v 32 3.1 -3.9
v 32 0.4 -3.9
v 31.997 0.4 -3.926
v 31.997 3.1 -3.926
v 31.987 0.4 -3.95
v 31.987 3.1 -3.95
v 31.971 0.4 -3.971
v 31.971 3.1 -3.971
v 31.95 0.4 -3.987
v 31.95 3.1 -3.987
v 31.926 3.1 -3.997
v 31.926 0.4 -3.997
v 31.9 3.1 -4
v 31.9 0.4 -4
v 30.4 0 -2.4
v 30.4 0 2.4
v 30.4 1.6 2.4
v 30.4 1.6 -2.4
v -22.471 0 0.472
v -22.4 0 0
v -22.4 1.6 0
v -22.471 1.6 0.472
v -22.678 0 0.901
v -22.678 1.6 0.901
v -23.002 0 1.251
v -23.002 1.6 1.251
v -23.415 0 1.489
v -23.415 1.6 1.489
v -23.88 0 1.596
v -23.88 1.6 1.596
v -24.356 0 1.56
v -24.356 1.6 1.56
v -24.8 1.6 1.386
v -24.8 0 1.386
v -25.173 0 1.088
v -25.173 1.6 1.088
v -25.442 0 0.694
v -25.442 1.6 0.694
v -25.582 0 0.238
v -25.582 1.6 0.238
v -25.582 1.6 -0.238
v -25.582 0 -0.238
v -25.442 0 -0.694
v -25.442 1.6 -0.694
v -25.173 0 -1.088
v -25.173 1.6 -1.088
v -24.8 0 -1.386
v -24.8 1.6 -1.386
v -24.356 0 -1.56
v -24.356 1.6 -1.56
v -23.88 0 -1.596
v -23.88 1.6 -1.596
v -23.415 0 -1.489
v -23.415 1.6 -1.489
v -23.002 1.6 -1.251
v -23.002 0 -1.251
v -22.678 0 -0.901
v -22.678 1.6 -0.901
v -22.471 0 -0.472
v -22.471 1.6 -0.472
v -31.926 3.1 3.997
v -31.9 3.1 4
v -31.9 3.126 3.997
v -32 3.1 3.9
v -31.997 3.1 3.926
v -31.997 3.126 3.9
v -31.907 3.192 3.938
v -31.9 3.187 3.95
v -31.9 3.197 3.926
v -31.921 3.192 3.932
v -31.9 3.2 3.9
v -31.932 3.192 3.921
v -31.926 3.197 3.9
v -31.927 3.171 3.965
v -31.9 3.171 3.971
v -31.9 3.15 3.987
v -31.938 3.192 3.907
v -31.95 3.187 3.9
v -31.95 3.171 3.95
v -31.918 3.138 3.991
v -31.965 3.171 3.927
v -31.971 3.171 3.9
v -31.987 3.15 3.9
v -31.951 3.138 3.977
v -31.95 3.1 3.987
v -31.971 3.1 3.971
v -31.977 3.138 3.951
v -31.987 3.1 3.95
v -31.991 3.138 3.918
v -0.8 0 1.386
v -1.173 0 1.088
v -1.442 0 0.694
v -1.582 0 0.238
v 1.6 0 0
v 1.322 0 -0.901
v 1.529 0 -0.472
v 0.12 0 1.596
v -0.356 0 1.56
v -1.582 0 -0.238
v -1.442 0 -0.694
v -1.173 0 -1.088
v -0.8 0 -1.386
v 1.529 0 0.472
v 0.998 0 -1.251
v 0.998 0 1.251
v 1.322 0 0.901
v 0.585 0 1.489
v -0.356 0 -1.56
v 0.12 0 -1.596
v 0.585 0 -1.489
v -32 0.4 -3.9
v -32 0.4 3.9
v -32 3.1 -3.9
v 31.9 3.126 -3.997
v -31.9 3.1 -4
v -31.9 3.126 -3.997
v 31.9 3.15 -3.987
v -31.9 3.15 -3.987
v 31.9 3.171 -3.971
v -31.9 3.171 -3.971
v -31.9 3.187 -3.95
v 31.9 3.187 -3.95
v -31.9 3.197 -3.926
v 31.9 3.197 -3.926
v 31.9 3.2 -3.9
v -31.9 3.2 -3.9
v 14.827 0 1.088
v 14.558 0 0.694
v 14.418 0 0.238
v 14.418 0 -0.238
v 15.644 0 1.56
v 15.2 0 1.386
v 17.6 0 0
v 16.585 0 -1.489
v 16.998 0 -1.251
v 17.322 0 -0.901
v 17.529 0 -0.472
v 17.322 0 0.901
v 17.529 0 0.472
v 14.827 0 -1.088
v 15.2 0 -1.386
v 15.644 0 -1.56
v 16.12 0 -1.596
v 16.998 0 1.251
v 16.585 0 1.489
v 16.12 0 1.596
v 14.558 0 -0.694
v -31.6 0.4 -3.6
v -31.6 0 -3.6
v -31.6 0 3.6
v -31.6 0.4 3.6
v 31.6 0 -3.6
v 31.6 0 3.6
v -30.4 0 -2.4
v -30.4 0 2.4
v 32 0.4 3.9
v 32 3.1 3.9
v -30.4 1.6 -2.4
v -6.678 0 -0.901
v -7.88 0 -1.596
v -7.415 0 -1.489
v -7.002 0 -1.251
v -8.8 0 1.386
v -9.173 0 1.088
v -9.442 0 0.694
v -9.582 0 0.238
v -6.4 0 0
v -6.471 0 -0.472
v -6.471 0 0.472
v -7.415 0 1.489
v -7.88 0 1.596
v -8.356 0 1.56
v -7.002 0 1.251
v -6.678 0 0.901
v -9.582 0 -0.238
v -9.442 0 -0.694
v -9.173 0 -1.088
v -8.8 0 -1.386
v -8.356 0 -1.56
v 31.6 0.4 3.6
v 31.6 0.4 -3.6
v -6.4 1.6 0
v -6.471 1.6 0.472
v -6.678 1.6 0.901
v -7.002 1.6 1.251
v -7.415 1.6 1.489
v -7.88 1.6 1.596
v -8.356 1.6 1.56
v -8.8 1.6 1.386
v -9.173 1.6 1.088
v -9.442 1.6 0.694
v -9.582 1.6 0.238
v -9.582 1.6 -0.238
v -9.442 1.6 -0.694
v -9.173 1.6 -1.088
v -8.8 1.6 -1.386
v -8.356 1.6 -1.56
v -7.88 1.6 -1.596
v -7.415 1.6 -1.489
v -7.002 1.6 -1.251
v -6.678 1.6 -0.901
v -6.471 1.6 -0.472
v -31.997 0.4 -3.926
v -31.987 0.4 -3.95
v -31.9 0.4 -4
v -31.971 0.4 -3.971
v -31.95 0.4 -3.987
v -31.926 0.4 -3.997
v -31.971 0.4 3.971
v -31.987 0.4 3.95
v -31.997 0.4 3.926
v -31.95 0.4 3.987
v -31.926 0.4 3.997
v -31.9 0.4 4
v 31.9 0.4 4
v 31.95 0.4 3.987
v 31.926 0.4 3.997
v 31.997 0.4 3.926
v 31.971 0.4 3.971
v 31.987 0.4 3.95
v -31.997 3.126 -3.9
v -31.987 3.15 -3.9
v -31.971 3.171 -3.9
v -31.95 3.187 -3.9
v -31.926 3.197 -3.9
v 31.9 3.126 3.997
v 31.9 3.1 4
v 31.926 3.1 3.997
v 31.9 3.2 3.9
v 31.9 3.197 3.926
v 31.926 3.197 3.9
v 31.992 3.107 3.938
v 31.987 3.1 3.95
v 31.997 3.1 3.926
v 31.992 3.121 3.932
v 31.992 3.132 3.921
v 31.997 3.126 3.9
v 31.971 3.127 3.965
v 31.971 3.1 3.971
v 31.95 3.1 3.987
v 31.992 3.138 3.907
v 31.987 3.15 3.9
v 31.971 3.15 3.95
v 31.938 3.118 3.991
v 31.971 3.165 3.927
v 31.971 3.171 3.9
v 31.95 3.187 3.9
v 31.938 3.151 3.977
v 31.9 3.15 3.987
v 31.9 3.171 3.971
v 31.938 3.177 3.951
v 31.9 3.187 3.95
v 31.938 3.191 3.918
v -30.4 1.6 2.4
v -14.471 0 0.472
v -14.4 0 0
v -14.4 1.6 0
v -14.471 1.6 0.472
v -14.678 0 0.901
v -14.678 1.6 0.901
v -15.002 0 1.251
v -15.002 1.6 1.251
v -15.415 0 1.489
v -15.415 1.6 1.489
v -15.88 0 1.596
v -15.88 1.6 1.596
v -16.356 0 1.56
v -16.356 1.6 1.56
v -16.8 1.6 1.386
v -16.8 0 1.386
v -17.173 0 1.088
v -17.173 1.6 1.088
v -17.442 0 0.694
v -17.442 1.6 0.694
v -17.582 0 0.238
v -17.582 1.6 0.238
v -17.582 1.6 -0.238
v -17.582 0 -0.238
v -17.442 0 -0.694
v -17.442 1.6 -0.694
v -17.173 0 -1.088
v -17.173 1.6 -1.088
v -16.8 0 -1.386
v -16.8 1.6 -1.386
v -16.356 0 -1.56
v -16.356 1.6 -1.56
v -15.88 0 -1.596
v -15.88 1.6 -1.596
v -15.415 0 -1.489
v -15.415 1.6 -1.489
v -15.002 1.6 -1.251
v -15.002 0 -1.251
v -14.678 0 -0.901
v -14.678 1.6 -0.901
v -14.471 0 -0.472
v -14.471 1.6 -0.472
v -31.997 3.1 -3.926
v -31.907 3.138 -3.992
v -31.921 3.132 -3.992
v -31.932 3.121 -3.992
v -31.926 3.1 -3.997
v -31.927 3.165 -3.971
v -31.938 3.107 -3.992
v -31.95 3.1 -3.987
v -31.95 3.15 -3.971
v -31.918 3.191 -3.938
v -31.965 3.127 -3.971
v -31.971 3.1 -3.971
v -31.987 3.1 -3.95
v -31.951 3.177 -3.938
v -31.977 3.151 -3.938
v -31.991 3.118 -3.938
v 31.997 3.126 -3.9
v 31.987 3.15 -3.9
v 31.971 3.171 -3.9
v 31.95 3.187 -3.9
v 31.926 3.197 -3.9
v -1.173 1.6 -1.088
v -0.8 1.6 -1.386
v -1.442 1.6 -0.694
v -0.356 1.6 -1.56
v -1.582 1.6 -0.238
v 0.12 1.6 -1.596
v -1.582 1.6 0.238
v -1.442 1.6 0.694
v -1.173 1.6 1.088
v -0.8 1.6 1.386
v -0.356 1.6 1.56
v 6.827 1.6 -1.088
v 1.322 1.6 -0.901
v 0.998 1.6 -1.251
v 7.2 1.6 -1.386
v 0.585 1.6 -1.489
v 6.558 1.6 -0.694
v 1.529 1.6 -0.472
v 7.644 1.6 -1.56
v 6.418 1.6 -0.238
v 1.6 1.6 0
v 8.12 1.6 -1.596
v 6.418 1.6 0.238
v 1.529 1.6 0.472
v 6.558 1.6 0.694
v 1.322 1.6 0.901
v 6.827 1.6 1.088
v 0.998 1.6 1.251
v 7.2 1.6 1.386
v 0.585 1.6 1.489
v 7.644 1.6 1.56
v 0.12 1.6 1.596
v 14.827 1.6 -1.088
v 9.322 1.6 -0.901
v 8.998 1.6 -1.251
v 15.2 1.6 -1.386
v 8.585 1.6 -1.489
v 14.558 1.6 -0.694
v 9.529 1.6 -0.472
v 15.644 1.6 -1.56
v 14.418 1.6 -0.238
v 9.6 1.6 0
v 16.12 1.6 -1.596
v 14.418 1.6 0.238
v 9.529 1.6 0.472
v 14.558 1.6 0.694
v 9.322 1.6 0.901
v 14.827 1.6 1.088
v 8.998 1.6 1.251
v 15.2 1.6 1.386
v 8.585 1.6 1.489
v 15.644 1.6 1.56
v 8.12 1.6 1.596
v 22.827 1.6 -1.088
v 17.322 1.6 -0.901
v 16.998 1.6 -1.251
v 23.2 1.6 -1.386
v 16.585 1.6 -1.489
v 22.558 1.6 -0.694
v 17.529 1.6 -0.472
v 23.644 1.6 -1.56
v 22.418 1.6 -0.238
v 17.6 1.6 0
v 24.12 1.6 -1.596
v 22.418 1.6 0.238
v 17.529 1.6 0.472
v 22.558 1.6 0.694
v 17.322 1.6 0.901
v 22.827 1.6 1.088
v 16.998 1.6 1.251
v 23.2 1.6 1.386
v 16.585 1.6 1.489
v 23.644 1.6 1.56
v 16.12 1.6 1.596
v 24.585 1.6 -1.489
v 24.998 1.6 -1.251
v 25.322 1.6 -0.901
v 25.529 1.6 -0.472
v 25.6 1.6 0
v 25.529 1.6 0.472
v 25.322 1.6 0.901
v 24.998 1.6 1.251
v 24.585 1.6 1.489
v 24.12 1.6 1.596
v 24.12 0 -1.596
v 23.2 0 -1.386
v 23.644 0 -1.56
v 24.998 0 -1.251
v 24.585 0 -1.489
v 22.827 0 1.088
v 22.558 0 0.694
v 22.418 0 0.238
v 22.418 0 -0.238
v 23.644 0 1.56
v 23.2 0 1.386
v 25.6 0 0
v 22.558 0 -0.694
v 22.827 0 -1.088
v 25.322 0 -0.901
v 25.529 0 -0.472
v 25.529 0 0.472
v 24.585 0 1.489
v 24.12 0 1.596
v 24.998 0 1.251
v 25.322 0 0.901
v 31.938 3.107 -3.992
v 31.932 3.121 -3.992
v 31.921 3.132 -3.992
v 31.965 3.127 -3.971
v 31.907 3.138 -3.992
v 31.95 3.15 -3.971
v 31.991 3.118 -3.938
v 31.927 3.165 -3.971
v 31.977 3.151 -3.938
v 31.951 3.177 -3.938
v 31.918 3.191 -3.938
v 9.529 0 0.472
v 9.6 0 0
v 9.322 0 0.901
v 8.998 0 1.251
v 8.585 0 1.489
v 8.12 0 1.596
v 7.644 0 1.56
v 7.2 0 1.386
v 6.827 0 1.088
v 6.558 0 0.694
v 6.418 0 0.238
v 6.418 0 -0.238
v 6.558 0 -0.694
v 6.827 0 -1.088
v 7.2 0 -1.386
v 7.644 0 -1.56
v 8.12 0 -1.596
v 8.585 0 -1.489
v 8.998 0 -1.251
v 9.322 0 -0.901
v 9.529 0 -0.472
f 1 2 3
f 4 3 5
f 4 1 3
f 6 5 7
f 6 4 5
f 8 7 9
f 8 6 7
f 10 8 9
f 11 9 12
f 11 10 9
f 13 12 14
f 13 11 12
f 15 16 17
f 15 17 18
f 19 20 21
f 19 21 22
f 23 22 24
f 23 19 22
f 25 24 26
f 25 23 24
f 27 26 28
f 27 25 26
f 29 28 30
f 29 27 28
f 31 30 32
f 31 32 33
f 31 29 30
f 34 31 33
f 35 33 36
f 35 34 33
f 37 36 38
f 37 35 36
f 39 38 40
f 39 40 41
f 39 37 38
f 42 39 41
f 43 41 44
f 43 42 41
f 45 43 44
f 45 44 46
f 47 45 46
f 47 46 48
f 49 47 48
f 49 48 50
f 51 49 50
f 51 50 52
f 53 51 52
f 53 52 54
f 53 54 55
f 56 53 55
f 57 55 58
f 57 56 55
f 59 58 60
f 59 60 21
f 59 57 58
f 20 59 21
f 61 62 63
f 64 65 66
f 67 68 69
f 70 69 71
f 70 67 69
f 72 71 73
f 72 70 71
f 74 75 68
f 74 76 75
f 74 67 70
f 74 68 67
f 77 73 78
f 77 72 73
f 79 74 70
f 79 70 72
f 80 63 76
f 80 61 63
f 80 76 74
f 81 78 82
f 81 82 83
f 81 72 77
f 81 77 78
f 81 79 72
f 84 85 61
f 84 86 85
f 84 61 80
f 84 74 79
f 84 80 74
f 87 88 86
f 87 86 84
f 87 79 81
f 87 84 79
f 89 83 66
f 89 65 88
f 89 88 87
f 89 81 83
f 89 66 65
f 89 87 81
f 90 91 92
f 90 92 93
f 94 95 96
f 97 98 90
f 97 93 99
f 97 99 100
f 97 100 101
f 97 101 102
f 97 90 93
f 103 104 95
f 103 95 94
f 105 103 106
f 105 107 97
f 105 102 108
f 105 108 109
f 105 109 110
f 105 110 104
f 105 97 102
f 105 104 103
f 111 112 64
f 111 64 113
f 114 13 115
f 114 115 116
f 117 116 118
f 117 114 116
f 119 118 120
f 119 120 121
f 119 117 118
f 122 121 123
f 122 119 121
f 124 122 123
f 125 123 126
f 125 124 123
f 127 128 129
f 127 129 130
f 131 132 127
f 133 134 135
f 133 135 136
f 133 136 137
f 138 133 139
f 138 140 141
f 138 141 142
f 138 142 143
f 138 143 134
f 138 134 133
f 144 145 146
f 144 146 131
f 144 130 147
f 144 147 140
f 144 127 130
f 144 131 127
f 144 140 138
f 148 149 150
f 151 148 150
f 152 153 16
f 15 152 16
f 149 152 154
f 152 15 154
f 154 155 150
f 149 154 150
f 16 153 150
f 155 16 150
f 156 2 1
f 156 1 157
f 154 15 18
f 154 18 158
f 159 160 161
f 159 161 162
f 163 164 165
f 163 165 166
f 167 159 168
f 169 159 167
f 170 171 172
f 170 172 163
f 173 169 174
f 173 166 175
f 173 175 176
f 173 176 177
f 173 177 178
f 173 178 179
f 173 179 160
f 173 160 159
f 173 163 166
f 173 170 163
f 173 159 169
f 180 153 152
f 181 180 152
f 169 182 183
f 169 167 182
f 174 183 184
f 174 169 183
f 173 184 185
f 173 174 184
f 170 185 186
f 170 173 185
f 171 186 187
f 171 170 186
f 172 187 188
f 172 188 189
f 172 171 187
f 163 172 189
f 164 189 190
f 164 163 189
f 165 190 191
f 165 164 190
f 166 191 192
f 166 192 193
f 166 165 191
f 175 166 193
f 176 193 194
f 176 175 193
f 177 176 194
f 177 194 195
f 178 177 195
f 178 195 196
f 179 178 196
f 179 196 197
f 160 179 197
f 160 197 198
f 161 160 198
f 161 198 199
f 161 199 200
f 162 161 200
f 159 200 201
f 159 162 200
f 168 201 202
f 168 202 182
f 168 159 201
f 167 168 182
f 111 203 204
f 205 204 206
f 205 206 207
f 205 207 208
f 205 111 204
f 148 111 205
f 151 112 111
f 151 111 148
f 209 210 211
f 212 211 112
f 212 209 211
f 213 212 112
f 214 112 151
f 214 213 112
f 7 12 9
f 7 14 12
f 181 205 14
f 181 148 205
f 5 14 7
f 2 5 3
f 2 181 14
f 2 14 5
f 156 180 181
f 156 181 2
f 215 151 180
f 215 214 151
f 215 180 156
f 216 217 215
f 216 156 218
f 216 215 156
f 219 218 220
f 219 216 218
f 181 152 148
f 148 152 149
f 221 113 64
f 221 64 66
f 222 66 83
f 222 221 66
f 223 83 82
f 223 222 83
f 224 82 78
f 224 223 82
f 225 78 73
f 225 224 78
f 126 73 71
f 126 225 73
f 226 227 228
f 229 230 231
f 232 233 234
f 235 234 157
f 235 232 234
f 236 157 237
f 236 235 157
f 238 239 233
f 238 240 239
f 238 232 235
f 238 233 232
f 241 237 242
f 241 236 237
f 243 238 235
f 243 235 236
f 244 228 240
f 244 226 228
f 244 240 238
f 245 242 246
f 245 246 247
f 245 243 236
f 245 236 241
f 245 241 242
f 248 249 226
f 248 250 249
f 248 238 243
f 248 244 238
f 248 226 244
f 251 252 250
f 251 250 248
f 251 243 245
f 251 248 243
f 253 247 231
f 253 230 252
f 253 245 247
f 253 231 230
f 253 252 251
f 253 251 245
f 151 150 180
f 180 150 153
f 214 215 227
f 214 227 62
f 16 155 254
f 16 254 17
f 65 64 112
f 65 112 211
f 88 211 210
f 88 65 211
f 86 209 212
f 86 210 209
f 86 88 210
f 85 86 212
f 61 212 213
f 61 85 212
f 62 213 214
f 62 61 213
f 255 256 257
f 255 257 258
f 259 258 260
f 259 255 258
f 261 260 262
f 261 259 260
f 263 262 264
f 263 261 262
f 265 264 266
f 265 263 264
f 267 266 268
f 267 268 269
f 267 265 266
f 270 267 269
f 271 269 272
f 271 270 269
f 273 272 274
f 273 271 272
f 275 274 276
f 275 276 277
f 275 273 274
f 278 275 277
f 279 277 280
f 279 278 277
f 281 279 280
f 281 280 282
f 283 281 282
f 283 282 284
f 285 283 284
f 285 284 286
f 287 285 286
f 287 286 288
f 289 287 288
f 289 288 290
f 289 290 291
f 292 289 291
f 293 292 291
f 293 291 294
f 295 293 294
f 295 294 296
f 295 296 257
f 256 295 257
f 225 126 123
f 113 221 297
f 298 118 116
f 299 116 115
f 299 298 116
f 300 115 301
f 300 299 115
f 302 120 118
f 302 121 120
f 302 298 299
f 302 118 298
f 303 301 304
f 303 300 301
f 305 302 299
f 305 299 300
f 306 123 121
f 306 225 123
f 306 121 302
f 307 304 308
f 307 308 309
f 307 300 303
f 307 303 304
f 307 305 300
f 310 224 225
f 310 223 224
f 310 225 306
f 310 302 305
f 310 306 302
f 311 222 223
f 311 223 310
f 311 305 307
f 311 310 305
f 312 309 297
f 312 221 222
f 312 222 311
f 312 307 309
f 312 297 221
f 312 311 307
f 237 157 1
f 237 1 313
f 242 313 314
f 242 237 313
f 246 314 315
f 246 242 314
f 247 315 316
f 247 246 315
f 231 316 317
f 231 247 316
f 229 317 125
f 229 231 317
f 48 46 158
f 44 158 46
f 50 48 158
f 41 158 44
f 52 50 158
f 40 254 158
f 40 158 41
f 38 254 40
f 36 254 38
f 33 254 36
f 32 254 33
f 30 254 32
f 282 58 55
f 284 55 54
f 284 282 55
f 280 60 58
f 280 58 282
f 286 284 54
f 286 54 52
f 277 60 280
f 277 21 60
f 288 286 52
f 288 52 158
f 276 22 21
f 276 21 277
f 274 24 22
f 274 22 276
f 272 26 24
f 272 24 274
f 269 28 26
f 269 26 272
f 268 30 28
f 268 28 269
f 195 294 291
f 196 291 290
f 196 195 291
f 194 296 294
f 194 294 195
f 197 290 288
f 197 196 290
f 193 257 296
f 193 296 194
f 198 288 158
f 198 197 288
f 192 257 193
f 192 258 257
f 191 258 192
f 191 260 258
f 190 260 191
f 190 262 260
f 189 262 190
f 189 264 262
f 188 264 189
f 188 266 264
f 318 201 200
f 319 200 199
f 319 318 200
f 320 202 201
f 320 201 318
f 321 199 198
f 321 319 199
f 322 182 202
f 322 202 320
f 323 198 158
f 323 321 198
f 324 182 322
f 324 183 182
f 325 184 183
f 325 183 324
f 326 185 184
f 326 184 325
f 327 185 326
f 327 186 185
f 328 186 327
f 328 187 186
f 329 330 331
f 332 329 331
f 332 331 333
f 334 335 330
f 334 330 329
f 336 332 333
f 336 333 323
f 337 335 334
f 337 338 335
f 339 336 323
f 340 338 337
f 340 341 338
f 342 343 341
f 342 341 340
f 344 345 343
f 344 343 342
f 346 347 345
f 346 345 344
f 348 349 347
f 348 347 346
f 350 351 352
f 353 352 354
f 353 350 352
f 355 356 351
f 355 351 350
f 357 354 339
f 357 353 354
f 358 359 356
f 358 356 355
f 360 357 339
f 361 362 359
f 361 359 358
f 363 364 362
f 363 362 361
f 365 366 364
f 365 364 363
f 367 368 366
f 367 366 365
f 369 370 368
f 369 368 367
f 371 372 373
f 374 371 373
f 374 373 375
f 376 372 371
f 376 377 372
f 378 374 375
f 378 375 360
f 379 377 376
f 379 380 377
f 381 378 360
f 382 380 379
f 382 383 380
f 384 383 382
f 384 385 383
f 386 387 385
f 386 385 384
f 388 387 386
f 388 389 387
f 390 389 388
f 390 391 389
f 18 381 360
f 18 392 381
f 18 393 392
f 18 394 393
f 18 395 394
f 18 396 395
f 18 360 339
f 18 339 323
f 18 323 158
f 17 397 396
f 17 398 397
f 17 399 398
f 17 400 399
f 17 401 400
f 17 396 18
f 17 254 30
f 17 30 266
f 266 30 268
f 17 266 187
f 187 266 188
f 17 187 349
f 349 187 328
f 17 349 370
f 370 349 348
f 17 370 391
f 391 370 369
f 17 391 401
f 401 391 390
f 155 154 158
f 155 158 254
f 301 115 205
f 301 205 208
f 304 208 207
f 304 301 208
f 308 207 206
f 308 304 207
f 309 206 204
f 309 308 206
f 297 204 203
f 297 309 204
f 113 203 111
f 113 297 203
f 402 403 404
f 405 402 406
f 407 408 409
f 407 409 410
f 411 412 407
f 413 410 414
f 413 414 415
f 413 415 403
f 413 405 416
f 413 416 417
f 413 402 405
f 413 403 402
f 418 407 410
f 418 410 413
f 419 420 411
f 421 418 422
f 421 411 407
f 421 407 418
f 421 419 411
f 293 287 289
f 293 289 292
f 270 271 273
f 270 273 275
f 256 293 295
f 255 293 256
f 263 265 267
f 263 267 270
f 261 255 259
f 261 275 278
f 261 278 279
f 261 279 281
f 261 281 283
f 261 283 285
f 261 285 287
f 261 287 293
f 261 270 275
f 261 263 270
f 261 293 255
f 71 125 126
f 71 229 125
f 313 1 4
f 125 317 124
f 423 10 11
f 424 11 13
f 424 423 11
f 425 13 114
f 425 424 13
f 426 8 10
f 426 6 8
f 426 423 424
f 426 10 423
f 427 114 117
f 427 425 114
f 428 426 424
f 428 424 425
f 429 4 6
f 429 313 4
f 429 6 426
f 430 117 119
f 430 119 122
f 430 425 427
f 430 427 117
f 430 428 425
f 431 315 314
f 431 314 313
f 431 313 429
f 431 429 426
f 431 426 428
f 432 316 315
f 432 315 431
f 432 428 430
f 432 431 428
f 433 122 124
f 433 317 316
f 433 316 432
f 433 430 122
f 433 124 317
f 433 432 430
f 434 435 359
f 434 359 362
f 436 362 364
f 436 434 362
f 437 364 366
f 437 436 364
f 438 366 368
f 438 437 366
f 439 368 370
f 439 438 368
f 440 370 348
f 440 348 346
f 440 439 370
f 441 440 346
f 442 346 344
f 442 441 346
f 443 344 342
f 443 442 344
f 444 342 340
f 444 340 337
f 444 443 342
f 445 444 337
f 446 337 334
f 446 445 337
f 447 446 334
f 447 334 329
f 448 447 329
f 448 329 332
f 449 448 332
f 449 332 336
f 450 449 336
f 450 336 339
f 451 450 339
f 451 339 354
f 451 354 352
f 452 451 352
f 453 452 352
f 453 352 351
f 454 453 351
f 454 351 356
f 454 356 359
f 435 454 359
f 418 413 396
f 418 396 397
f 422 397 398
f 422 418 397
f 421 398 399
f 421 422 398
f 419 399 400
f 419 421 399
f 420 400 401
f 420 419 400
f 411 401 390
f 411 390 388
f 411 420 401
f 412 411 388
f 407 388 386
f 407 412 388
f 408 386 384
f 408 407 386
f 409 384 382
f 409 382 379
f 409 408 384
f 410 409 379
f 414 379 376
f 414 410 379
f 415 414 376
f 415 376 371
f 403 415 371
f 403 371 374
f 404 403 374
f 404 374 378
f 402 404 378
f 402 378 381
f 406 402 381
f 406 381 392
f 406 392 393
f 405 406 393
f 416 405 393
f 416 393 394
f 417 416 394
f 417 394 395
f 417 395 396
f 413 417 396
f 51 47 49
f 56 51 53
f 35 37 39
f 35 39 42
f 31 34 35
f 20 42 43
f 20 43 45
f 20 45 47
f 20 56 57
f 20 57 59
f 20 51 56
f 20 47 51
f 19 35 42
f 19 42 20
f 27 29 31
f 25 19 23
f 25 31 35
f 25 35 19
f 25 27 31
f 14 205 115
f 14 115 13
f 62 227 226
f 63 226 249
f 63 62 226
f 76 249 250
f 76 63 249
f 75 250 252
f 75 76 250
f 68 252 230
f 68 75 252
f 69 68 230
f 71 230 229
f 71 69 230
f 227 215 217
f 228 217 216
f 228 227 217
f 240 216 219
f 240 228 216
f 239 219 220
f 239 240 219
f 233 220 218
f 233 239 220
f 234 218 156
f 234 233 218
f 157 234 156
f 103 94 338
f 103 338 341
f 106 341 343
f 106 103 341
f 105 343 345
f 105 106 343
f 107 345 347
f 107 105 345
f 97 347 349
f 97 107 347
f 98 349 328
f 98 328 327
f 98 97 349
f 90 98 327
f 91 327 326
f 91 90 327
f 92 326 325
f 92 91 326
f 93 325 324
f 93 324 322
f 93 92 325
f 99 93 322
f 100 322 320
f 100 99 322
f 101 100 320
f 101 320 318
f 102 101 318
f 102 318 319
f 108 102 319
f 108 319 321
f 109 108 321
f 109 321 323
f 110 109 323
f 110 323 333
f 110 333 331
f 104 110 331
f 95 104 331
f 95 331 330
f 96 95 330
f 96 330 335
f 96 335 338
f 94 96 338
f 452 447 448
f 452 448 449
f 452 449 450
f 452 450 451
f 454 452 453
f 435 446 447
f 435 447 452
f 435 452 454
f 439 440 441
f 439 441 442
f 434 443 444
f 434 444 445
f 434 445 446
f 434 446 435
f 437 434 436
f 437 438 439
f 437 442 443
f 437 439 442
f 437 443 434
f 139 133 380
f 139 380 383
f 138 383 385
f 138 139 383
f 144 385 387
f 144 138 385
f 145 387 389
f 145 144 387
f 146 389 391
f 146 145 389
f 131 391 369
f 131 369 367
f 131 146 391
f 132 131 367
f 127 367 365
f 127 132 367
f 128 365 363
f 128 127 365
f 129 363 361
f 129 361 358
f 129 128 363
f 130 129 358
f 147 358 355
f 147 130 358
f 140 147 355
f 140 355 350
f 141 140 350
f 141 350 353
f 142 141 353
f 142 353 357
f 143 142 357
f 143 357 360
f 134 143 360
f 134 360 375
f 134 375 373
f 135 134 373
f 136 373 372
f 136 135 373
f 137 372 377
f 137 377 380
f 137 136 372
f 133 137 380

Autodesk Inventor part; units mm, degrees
ref_plane "YZ Plane" through (0, 0, 0) normal (1, 0, 0) x (0, 1, 0)
ref_plane "XZ Plane" through (0, 0, 0) normal (0, 1, 0) x (-1, 0, 0)
ref_plane "XY Plane" through (0, 0, 0) normal (0, 0, 1) x (1, 0, 0)
sketch "Sketch2" plane through (0, 0, 0) normal (0, 1, 0) x (-1, 0, 0)
  line L0 (-32, 4) -> (32, 4)
  line L1 (32, 4) -> (32, -4)
  line L2 (32, -4) -> (-32, -4)
  line L3 (-32, -4) -> (-32, 4)
  point P0 (0, 0)
  point P1 (0, 4)
  point P2 (-32, 0)
  dimension "d0" = 64
  dimension "d1" = 8
extrude "Extrusion1" add sketch "Sketch2" along normal blind 3.2
sketch "Sketch3" plane through (0, 0, 0) normal (0, -1, 0) x (1, 0, 0)
  line L0 (32, 4) -> (-32, 4) projected
  line L1 (-32, 4) -> (-32, -4) projected
  line L2 (-30.4, 2.4) -> (30.4, 2.4)
  line L3 (30.4, 2.4) -> (30.4, -2.4)
  line L4 (30.4, -2.4) -> (-30.4, -2.4)
  line L5 (-30.4, -2.4) -> (-30.4, 2.4)
  circle A0 centre (-24, 4) radius 3.2569
  circle A1 centre (-24, 4) radius 2.4
  line L6 (-32, -4) -> (32, -4) projected
  circle A2 centre (0, 0) radius 1.6
  line L7 (32, -4) -> (32, 4) projected
  line L8 (-20, 0) -> (-12, 0) construction
  line L9 (-12, 0) -> (-4, 0) construction
  line L10 (4, 0) -> (12, 0) construction
  line L11 (12, 0) -> (20, 0) construction
  line L12 (-4, 0) -> (4, 0) construction
  line L13 (-28, 0) -> (-20, 0) construction
  line L14 (20, 0) -> (28, 0) construction
  line L15 (-31.6, 3.6) -> (31.6, 3.6)
  line L16 (31.6, 3.6) -> (31.6, -3.6)
  line L17 (31.6, -3.6) -> (-31.6, -3.6)
  line L18 (-31.6, -3.6) -> (-31.6, 3.6)
  point P0 (-30.4, 0)
  point P1 (0, 2.4)
  point P2 (0, 3.6)
  point P3 (-31.6, 0)
  dimension "d8" = 1.6
  dimension "d60" = 6.5137
  dimension "d61" = 4.8
  dimension "d62" = 1.6
  dimension "d75" = 8
  dimension "d76" = 8
  dimension "d86" = 3.2
  dimension "d93" = 8
  dimension "d99" = 0.4
  dimension "d100" = 0.4
extrude "Extrusion2" cut sketch "Sketch3" against normal blind 1.6 contours A0 L2 A1 | L2 L3 L4 L5 A0 | A1 L2 | A2
extrude "Extrusion7" cut sketch "Sketch3" against normal blind 0.4 contours L7 L6 L1 L0 A0 L15 L18 L17 L16 | A0 L15 A1 L0 | A1 L15 L0 | L0 A1 L15 A0
extrude "Extrusion6" add sketch "Sketch3" against normal up to next contours A2
pattern_linear "Rectangular Pattern3" count 7 spacing 8 along (-1, 0, 0) of "Extrusion6" first direction both ways yes
fillet "Fillet1" radius 0.1 8 edges at (-32, 1.8, 4) (0, 3.2, 4) (-32, 3.2, 0) (32, 1.8, 4) (32, 3.2, 0) (0, 3.2, -4) (32, 1.8, -4) (-32, 1.8, -4)
equation "\"d4\" = 0.333333 * lh"
equation "\"d8\" = d62"
equation "\"d60\" = tubeod"
equation "\"d61\" = kd"
equation "\"d62\" = wall"
equation "\"d75\" = lu"
equation "\"d76\" = d75"
equation "\"d86\" = pd"
equation "\"d93\" = lu"
equation "\"d99\" = gw"
equation "\"d100\" = gw"
equation "\"d11\" = 0.333333 * lh - topthk"
equation "\"d101\" = gh"
equation "\"d91\" = lu"
equation "\"d22\" = lf"
equation "\"lh\" = 9.6"
equation "\"tubeod\" = 6.513708"
equation "\"kd\" = 4.8"
equation "\"wall\" = 1.6"
equation "\"lu\" = 8"
equation "\"pd\" = 3.2"
equation "\"gw\" = 0.4"
equation "\"topthk\" = 1.6"
equation "\"gh\" = 0.4"
equation "\"lf\" = 0.1"
properties part number "4162-LtBluishGray" material "ABS Plastic"
